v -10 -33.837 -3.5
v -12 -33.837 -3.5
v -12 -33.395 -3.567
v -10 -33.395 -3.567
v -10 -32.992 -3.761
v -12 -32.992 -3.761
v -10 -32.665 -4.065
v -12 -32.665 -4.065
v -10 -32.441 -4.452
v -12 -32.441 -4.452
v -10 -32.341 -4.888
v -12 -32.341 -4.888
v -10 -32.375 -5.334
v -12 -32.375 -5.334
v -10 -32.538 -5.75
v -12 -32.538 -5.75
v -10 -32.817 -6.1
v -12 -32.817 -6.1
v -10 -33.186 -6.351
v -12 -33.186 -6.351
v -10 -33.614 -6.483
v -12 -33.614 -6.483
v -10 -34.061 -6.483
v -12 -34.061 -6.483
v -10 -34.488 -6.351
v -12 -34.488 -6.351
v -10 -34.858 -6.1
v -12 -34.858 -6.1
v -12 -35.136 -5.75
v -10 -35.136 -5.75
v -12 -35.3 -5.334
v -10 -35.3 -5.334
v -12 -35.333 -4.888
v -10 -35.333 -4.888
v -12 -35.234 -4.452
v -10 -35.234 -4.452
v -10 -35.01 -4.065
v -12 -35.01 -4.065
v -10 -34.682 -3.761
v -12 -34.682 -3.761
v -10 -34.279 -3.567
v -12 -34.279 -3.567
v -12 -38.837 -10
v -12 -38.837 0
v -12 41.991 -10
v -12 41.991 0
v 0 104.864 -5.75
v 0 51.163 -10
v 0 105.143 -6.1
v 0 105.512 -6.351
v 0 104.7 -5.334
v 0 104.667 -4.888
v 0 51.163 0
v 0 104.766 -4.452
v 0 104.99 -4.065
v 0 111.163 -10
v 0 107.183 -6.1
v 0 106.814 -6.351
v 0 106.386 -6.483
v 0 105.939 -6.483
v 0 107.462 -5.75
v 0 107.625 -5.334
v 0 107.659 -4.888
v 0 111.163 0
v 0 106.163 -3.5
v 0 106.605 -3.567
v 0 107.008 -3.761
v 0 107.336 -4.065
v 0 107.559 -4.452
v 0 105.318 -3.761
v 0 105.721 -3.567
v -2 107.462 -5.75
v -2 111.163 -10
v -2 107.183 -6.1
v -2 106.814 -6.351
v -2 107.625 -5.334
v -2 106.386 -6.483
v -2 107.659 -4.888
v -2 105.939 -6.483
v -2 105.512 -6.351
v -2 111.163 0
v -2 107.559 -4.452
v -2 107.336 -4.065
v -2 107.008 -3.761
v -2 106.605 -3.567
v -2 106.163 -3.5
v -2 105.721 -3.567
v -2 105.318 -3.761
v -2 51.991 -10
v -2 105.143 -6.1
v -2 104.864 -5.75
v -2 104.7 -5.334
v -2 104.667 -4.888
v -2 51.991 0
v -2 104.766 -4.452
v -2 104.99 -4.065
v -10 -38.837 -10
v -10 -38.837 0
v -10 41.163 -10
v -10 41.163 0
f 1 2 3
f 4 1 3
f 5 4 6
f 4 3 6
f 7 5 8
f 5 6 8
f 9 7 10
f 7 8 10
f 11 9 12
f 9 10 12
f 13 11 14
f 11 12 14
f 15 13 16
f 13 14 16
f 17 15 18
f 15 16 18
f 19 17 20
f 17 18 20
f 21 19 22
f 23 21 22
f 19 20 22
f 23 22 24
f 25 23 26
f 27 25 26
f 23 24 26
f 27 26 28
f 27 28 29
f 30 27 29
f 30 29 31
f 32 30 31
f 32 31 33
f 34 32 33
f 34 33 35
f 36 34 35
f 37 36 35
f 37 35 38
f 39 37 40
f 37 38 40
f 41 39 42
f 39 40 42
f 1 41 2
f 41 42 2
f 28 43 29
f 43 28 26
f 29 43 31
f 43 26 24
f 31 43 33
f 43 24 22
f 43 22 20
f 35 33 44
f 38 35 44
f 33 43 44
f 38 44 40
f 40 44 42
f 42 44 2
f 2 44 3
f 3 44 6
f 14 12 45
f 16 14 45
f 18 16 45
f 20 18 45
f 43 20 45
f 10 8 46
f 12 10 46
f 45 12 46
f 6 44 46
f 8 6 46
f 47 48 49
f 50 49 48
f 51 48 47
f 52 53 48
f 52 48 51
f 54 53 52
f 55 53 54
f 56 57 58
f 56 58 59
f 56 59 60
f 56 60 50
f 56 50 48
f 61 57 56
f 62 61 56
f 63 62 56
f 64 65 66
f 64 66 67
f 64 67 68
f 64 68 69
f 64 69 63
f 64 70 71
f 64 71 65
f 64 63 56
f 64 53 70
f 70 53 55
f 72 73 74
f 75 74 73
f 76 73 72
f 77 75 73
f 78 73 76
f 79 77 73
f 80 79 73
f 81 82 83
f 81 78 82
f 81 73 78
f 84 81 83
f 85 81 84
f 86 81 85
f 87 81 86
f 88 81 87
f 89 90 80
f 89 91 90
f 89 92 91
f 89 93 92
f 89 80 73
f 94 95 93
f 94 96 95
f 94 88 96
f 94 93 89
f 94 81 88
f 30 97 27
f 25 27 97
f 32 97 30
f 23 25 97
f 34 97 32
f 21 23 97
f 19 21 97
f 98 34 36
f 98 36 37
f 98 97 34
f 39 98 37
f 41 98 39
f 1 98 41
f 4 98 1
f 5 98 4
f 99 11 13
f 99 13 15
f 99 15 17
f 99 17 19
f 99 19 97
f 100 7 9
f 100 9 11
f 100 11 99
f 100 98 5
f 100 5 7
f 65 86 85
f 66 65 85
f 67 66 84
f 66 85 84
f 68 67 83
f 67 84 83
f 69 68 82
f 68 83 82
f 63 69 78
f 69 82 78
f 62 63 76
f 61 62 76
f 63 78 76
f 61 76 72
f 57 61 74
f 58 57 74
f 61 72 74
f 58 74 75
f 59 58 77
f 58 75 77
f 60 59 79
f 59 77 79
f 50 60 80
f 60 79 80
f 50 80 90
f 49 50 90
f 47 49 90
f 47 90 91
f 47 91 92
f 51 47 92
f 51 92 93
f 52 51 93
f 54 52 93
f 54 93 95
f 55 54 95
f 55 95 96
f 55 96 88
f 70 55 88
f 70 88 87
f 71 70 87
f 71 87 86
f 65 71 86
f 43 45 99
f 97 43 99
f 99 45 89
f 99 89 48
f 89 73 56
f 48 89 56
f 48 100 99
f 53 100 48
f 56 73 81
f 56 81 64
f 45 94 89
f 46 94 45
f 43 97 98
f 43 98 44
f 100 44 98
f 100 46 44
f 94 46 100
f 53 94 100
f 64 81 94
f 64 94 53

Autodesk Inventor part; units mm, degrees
ref_plane "YZ Plane" through (0, 0, 0) normal (1, 0, 0) x (0, 1, 0)
ref_plane "XZ Plane" through (0, 0, 0) normal (0, 1, 0) x (-1, 0, 0)
ref_plane "XY Plane" through (0, 0, 0) normal (0, 0, 1) x (1, 0, 0)
sketch "Skizze1" plane through (0, 0, 0) normal (0, 0, 1) x (1, 0, 0)
  line L0 (-14.4, 0) -> (2.4, 0) projected
  line L1 (0, -68.8373) -> (0, 141.1627) projected
  line L2 (-10, -38.8373) -> (-10, 41.1627)
  line L3 (-10, 41.1627) -> (0, 51.1627)
  line L4 (0, 51.1627) -> (0, 111.1627)
  line L5 (-10, -38.8373) -> (-12, -38.8373)
  line L6 (-12, -38.8373) -> (-12, 41.9912)
  line L7 (-2, 51.9912) -> (-12, 41.9912)
  line L8 (-2, 111.1627) -> (0, 111.1627)
  line L9 (-2, 111.1627) -> (-2, 51.9912)
  point P0 (0, 0)
  dimension "d0" = 80
  dimension "d2" = 60
  dimension "d5" = 2
  dimension "d6" = 2
  dimension "d7" = 2
  dimension "d20" = 10
  dimension "d22" = 150
extrude "Extrusion1" add sketch "Skizze1" against normal blind 10 contours L6 L7 L9 L8 L1 L3 L2 L0 | L0 L2 L5 L6
sketch "Skizze2" plane through (-12, -38.8373, 0) normal (-1, 0, 0) x (0, 0, 1)
  line L0 (0, 80.8284) -> (0, 0) projected
  line L1 (0, 0) -> (-10, 0) projected
  circle A0 centre (-5, 5) radius 1.5
  point P0 (0, 38.8373)
  dimension "d10" = 5
  dimension "d11" = 5
  dimension "d12" = 3
extrude "Extrusion2" cut sketch "Skizze2" against normal blind 5
sketch "Skizze3" plane through (-2, 51.9912, 0) normal (-1, 0, 0) x (0, 0, 1)
  line L0 (-10, 0) -> (-10, 59.1716) projected
  line L1 (0, 59.1716) -> (-10, 59.1716) projected
  circle A0 centre (-5, 54.1716) radius 1.5
  point P0 (0, -51.9912)
  dimension "d15" = 5
  dimension "d16" = 5
  dimension "d17" = 3
extrude "Extrusion3" cut sketch "Skizze3" against normal blind 5
properties part number "Gestänge"
